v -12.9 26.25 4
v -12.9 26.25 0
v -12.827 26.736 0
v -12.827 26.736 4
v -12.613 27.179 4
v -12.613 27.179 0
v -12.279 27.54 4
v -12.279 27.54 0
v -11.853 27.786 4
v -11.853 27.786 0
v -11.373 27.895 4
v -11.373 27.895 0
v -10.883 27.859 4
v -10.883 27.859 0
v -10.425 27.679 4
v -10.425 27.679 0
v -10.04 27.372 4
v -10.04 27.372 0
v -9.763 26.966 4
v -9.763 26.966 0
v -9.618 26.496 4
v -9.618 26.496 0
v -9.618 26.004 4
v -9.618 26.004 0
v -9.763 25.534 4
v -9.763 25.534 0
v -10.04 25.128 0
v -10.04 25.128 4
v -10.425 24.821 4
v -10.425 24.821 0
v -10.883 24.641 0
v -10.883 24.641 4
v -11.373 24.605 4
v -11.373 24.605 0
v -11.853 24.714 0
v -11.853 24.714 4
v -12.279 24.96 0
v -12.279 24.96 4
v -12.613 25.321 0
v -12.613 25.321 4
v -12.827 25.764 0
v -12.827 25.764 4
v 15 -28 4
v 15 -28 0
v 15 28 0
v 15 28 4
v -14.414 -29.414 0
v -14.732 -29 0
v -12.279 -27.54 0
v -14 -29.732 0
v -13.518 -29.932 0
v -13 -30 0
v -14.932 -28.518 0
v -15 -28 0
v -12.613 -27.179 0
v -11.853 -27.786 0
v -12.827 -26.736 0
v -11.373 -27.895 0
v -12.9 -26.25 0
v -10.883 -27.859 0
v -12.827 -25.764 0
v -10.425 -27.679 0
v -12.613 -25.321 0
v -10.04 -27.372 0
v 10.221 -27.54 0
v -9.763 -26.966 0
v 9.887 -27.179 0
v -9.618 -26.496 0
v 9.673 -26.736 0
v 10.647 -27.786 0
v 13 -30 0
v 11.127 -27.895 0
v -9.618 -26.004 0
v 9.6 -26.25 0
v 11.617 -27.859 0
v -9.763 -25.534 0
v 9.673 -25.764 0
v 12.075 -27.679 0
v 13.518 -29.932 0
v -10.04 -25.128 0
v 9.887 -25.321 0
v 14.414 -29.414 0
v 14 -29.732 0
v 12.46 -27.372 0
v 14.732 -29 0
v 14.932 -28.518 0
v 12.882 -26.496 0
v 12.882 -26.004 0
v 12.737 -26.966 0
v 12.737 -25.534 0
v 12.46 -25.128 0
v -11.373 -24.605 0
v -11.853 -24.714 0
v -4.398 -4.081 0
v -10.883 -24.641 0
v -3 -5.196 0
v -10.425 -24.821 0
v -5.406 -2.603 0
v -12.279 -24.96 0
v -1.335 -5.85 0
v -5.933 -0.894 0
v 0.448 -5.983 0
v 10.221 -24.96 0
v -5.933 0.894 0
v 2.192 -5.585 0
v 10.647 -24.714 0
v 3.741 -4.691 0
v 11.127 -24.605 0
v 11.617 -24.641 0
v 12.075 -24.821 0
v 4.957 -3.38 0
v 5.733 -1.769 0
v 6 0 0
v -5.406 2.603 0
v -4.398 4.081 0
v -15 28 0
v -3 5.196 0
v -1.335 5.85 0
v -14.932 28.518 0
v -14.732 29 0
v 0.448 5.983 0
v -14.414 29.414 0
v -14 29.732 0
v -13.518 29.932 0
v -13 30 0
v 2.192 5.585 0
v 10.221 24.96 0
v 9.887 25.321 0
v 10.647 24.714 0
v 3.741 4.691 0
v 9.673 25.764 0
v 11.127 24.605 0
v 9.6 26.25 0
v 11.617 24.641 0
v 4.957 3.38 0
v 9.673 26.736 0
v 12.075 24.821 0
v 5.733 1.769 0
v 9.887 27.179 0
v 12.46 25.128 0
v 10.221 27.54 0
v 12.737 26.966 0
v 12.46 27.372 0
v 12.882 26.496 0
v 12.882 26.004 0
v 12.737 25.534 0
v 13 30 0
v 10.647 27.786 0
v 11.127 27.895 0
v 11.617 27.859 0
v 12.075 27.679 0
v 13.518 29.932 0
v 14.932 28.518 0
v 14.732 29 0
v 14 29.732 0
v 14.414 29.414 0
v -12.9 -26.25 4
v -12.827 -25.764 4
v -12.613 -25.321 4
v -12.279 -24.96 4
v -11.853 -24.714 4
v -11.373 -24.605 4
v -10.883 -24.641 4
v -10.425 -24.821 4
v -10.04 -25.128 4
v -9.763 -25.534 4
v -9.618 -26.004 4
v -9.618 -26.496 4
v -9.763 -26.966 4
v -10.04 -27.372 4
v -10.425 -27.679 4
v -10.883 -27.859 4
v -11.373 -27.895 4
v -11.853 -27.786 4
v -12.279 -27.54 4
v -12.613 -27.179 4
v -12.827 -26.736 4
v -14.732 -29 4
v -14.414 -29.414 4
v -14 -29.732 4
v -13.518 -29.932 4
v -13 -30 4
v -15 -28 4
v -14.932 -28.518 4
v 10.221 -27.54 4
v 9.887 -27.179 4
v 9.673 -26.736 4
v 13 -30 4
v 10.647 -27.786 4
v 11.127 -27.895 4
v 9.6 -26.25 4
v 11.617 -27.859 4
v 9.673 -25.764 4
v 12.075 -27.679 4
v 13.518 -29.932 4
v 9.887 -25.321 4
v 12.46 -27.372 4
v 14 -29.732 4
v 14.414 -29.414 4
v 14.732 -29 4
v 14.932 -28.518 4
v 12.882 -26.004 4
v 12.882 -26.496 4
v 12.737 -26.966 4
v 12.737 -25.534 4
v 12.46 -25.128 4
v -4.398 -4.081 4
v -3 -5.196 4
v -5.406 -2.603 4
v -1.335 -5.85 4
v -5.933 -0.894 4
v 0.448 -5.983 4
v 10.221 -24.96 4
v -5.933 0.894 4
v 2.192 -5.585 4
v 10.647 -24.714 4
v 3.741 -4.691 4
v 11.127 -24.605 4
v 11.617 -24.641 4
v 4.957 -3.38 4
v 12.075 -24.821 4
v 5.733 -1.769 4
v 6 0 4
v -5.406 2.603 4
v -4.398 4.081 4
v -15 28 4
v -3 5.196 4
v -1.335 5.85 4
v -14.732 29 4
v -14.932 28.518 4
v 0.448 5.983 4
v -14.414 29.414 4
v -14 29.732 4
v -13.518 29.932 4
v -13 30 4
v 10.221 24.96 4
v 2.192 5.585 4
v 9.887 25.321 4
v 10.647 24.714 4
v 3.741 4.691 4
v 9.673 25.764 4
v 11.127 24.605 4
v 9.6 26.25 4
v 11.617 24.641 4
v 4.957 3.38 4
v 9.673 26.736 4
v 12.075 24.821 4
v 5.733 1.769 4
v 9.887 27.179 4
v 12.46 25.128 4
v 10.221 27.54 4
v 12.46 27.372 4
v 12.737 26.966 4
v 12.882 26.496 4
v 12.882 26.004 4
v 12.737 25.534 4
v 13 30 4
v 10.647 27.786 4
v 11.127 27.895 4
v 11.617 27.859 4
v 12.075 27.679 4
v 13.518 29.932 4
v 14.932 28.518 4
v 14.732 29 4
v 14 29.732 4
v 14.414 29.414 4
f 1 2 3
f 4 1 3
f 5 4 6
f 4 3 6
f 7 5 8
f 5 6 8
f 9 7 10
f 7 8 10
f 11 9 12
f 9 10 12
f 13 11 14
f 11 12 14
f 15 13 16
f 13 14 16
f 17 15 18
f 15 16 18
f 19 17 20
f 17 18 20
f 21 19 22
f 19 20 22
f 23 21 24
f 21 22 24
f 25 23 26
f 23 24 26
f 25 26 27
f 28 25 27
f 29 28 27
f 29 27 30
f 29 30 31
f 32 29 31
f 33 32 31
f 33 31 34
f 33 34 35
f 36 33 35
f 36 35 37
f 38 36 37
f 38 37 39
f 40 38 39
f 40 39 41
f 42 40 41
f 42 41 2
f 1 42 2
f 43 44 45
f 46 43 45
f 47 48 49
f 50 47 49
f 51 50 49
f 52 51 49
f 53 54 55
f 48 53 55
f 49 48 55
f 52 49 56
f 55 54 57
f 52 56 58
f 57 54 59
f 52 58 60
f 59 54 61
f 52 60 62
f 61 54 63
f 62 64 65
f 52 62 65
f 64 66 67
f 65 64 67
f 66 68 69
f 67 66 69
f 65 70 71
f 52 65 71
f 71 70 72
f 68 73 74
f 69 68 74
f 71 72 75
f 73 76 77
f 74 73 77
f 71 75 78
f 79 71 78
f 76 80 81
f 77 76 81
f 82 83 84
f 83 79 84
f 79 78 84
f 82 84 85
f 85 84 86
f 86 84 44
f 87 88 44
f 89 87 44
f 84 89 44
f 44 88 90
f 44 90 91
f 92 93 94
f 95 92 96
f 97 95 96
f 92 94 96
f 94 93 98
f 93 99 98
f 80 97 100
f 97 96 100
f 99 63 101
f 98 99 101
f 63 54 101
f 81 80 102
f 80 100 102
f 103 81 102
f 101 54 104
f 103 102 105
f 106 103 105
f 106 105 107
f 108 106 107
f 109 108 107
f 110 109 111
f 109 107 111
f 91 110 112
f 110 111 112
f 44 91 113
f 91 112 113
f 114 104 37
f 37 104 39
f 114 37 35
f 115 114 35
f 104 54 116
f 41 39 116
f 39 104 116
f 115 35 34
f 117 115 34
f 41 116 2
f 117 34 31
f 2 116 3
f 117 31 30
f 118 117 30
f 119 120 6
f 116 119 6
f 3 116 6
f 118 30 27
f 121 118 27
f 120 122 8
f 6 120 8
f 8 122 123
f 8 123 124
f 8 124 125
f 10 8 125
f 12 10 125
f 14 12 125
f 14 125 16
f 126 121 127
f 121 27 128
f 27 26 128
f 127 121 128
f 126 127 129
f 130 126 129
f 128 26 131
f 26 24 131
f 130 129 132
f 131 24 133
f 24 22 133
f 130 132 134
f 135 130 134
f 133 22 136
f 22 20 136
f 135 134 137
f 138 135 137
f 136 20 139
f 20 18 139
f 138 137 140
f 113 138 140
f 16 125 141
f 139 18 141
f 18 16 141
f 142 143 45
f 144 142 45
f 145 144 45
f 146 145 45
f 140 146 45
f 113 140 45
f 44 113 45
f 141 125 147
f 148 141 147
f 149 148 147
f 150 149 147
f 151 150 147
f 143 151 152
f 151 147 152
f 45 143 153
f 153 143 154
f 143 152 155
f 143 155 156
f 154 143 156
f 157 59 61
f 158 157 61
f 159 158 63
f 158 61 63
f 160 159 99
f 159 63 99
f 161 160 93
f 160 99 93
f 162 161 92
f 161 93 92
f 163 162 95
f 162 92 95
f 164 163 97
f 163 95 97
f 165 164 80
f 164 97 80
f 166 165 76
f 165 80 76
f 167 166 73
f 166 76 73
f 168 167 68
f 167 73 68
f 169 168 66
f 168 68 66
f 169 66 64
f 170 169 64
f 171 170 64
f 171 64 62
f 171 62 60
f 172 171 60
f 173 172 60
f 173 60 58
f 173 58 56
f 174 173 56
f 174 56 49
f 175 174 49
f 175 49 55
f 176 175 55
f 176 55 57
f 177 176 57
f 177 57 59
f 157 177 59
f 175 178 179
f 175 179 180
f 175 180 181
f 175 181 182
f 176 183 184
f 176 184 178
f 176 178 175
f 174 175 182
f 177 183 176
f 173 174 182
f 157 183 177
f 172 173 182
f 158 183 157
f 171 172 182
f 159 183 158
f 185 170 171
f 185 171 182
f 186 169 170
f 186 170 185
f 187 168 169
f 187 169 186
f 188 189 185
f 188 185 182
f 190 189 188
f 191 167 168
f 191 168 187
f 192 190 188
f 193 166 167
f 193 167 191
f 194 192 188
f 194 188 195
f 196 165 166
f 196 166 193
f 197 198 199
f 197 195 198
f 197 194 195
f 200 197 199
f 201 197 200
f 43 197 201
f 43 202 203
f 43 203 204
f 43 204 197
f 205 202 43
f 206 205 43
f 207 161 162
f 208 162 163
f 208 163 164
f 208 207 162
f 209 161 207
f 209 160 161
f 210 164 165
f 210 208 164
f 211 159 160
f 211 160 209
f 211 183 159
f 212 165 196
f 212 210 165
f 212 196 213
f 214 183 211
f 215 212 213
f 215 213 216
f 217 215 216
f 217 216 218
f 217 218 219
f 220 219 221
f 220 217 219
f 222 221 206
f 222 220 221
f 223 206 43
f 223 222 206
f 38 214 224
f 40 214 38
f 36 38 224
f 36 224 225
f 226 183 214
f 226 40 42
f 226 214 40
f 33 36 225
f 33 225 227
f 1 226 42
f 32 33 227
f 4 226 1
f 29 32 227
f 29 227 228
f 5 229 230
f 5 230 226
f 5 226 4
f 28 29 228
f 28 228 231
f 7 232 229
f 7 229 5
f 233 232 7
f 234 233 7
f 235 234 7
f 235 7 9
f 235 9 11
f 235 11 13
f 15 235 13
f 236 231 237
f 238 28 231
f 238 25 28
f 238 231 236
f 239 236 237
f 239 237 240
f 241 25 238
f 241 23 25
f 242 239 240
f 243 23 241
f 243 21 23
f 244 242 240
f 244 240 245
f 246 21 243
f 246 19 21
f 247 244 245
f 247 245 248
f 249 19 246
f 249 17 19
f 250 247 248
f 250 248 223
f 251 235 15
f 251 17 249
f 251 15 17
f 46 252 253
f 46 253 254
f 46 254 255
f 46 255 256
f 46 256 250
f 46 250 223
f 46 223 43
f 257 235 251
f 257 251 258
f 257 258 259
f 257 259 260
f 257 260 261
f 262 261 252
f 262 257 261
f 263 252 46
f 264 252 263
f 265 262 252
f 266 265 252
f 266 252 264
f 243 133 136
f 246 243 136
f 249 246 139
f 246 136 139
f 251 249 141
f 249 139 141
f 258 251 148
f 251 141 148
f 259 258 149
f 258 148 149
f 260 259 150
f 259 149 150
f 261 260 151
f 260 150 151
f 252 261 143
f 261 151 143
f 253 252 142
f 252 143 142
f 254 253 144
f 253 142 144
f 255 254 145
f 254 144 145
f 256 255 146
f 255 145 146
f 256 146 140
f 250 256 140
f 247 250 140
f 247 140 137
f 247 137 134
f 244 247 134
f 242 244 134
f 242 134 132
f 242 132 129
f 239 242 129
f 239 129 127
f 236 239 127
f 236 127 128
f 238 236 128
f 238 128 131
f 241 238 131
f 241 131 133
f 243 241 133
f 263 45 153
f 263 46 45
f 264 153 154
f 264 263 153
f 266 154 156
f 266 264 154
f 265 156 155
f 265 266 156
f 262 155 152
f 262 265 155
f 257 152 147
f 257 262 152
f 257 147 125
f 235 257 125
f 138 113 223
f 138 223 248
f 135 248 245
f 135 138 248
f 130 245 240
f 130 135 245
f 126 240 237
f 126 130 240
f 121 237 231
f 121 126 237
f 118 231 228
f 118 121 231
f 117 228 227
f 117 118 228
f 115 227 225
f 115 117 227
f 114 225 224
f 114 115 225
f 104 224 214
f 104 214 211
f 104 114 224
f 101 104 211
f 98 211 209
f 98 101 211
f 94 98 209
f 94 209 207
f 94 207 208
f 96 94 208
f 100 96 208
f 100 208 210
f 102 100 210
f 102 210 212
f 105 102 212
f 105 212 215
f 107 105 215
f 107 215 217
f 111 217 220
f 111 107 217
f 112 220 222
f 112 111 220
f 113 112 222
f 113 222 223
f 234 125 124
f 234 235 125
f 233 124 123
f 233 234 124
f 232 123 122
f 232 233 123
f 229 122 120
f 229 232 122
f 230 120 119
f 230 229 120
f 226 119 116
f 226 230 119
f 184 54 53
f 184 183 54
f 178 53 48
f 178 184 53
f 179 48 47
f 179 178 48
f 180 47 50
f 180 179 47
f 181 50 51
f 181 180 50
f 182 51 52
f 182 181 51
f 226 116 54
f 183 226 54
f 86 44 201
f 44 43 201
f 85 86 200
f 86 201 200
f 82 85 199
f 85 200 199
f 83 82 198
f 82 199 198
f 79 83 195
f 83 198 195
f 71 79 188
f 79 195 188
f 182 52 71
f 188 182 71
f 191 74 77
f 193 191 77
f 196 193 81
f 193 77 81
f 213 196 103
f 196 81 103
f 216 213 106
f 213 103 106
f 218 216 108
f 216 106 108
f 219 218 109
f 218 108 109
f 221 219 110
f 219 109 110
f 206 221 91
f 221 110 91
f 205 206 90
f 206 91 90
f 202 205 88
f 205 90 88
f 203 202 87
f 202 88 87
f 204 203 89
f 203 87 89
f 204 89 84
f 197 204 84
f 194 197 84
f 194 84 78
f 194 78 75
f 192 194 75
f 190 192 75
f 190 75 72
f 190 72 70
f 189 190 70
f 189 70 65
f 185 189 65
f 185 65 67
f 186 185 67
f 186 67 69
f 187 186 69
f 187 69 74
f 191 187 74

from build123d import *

# Parameters (mm, degrees)
SKETCH_6_R         = 6
EXTRUDE_4_DEPTH    = 4
FILLET_2_R         = 2
FILLET_6_R         = 2
FILLET_12_R        = 2
FILLET_16_R        = 2
HOLE_WIZARD_M4_1_D = 3.3


with BuildPart() as part:
    # 草图6 → 凸台-拉伸4 (new body)
    with BuildSketch(Plane.XY):
        Polygon((-15, -22.5), (-15, -30), (-7.5, -30), (7.5, -30), (15, -30), (15, -22.5), (15, 22.5), (15, 30), (7.5, 30), (-7.5, 30), (-15, 30), (-15, 22.5), align=None)
        Circle(SKETCH_6_R, mode=Mode.SUBTRACT)
    extrude(amount=EXTRUDE_4_DEPTH)

    # 圆角2
    fillet_2_edges = [part.edges().sort_by_distance(p)[0] for p in [
        (15, 30, 2),
    ]]
    fillet(fillet_2_edges, radius=FILLET_2_R)

    # 圆角6
    fillet_6_edges = [part.edges().sort_by_distance(p)[0] for p in [
        (15, -30, 2),
    ]]
    fillet(fillet_6_edges, radius=FILLET_6_R)

    # 圆角12
    fillet_12_edges = [part.edges().sort_by_distance(p)[0] for p in [
        (-15, 30, 2),
    ]]
    fillet(fillet_12_edges, radius=FILLET_12_R)

    # 圆角16
    fillet_16_edges = [part.edges().sort_by_distance(p)[0] for p in [
        (-15, -30, 2),
    ]]
    fillet(fillet_16_edges, radius=FILLET_16_R)

    # M4 螺纹孔1 (through all)
    with Locations(Plane.XY.offset(4)):
        with Locations((-11.25, 26.25), (11.25, 26.25), (11.25, -26.25), (-11.25, -26.25)):
            Hole(HOLE_WIZARD_M4_1_D / 2)


solid = part.part
